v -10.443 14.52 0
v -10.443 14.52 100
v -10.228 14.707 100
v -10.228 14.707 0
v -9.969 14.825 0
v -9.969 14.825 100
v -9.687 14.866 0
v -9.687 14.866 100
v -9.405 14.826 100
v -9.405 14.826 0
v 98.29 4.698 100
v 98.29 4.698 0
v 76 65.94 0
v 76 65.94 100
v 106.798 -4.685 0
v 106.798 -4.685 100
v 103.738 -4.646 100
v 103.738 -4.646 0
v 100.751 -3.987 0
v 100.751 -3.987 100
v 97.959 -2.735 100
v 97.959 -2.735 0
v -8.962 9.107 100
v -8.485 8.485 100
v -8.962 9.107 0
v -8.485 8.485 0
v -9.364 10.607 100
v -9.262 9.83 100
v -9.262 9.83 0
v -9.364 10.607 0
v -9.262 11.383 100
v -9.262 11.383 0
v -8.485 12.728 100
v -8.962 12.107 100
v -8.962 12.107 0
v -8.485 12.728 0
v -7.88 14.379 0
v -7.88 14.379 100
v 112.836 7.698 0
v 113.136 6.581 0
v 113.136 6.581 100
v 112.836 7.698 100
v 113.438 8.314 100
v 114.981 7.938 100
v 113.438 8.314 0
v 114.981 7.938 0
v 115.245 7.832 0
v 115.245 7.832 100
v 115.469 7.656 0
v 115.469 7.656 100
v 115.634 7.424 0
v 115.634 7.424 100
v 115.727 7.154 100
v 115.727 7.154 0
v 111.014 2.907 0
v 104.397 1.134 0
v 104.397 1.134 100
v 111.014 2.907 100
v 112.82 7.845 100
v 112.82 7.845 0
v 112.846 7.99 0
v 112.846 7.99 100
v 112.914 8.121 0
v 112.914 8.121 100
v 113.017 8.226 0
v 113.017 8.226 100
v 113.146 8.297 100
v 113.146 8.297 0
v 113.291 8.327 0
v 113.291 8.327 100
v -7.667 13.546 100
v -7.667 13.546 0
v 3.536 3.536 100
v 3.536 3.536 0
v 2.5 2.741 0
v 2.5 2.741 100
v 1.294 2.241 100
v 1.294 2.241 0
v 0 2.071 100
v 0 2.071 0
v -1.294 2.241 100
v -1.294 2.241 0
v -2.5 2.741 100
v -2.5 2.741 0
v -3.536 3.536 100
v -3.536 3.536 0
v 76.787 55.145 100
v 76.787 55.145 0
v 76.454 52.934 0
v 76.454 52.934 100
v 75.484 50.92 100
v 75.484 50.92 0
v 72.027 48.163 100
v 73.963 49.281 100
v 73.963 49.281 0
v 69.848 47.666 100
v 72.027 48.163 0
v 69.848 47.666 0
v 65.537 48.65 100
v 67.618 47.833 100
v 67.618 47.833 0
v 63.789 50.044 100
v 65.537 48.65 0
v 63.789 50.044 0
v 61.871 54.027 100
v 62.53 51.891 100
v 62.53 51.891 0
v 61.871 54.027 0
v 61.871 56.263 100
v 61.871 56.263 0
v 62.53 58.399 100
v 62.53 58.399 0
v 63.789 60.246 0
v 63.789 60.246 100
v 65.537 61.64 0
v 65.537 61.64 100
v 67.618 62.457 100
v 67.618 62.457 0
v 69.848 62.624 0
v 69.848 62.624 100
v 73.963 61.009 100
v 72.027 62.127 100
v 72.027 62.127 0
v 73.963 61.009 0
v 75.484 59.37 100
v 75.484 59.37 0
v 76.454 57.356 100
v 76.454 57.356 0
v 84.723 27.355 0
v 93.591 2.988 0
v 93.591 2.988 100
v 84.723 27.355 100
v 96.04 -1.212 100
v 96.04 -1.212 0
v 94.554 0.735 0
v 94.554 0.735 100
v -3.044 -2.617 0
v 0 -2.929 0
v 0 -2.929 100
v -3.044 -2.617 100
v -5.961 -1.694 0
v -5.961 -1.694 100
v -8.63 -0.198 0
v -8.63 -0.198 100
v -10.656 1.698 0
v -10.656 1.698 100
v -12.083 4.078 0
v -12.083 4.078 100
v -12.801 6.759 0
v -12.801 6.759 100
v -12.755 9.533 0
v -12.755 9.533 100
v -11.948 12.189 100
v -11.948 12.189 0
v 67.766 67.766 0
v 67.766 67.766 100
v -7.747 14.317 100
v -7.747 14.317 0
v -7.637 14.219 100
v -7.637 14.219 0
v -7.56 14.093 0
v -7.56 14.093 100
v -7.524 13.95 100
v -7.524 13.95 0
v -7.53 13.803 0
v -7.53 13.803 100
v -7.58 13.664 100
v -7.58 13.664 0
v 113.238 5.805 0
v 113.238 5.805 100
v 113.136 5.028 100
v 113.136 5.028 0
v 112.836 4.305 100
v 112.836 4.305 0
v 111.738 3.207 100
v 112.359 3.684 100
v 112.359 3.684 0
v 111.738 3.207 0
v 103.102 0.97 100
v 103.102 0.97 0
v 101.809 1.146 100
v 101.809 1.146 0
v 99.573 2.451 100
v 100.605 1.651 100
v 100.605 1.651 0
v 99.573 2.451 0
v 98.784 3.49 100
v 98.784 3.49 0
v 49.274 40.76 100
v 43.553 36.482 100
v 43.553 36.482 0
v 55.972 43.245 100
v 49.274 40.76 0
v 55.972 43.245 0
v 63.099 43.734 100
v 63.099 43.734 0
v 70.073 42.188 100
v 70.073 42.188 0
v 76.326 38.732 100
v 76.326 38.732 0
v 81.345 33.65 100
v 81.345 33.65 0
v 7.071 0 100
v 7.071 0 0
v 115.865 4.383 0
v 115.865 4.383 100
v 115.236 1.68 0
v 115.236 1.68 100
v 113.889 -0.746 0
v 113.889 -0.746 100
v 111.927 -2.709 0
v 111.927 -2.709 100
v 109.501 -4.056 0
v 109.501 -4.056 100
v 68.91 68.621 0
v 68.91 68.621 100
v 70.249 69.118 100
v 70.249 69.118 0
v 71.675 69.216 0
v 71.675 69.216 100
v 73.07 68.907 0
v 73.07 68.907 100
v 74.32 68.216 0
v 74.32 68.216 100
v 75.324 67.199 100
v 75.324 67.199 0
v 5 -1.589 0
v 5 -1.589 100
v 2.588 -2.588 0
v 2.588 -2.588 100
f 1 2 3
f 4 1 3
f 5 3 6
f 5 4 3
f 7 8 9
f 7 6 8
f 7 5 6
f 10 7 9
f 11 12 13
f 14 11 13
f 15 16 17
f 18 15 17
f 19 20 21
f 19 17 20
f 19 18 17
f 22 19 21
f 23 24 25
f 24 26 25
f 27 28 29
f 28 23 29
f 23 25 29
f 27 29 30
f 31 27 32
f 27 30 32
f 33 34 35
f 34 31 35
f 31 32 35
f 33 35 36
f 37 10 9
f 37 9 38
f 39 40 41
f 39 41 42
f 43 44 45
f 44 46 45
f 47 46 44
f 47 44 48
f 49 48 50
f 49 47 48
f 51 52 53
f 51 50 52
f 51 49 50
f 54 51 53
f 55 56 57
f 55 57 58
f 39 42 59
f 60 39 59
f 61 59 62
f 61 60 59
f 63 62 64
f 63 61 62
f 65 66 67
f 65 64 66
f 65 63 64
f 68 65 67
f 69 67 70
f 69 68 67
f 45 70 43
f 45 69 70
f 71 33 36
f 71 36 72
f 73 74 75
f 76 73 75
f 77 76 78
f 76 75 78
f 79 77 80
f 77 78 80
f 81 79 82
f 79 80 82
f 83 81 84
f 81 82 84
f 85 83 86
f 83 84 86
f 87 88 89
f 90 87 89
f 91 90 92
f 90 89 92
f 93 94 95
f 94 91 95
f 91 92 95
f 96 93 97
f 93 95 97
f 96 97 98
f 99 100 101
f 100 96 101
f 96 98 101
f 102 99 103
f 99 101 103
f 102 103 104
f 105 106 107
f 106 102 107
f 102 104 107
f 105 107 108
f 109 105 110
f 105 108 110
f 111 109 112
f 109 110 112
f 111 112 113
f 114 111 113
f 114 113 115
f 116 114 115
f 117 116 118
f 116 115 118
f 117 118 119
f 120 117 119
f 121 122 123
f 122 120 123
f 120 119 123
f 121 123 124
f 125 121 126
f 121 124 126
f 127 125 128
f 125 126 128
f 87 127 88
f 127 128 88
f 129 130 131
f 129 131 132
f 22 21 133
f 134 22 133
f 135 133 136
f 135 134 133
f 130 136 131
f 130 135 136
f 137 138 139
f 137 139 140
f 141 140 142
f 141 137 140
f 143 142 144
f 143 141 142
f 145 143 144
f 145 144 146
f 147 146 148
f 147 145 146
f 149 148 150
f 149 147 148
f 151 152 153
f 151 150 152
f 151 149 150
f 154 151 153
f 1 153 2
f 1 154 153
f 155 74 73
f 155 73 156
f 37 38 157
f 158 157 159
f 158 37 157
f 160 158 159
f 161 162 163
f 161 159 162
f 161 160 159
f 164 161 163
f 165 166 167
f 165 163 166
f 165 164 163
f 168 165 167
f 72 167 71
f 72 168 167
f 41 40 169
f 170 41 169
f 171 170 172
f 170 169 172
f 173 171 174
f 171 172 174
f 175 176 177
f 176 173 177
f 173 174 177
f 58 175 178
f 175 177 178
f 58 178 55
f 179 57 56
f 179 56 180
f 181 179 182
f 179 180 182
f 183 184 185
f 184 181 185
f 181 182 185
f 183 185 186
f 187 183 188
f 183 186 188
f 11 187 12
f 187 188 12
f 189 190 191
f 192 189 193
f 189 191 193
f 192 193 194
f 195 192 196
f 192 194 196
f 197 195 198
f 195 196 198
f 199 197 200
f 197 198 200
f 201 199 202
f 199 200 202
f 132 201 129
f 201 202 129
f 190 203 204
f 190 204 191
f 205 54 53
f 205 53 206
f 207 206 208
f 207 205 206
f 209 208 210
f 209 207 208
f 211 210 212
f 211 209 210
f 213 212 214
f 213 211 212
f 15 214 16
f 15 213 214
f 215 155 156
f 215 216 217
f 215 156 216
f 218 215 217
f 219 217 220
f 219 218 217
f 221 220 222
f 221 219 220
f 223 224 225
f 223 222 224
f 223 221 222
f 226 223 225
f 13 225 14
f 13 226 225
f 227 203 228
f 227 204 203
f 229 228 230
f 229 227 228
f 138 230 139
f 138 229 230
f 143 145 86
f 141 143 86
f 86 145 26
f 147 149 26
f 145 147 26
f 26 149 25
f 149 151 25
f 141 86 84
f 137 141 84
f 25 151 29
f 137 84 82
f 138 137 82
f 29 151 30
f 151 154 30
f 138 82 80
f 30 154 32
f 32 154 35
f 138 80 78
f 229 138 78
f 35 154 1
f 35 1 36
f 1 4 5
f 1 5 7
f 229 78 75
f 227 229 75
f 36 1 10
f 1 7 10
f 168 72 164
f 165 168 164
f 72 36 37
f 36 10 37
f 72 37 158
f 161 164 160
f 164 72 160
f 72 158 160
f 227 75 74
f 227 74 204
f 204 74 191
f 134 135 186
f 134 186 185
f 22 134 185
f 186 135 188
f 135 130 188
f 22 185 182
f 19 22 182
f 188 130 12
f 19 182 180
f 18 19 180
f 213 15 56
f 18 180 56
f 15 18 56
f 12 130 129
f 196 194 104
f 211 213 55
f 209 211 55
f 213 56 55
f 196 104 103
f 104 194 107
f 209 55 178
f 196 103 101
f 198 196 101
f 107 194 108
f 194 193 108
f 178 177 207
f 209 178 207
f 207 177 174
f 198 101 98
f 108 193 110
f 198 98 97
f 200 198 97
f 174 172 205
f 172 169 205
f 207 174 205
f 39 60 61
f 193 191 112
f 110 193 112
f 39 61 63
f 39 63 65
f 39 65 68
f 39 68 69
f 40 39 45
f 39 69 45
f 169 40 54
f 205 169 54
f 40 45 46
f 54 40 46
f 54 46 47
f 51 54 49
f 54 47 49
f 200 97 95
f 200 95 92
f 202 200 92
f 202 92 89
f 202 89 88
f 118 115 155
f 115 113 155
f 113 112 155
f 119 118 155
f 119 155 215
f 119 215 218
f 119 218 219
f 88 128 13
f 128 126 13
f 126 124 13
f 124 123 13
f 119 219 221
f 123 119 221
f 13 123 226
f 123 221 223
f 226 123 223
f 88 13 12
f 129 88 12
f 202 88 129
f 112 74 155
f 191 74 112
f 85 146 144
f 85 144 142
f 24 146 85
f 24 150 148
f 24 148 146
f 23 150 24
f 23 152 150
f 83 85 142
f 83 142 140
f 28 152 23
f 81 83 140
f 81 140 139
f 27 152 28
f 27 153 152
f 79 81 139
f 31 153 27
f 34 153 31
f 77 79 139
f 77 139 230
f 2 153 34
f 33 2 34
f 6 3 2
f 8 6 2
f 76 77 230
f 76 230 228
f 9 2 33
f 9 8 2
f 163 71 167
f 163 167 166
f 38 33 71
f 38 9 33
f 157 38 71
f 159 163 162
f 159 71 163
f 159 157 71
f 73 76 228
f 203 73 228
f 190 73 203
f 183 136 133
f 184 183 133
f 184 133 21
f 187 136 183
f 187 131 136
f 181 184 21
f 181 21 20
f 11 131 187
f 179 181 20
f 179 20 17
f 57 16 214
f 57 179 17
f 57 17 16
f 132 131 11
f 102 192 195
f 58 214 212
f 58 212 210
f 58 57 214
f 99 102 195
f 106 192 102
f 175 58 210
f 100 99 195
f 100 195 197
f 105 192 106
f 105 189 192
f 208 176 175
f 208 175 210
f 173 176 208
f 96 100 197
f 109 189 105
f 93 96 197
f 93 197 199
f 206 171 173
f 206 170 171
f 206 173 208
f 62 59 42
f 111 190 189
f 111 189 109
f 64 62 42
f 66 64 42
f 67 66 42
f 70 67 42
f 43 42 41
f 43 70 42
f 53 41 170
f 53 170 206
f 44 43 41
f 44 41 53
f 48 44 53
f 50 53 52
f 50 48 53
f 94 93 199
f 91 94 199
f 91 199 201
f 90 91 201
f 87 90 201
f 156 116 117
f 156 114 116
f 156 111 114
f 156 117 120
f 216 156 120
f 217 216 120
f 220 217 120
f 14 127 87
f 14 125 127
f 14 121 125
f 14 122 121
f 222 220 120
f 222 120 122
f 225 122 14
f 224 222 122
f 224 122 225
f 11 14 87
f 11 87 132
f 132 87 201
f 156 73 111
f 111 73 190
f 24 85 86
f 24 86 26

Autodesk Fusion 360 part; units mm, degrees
sketch "Sketch1" plane through (0, 0, 0) normal (0, 0, 1) x (1, 0, 0)
  line L0 (3.5355, 3.5355) -> (67.7657, 67.7657)
  line L1 (98.2899, 4.6985) -> (75.9997, 65.9403)
  line L2 (-3.5355, 3.5355) -> (-8.4853, 8.4853)
  arc A0 (75.9997, 65.9403) -> (67.7657, 67.7657) centre (71.3012, 64.2302) ccw
  line L3 (-8.4853, 12.7279) -> (-7.6674, 13.5458)
  line L4 (-10.6066, 10.6066) -> (-5.6066, 10.6066) construction
  arc A1 (-3.5355, 3.5355) -> (3.5355, 3.5355) centre (0, 7.0711) ccw
  arc A2 (-8.4853, 12.7279) -> (-8.4853, 8.4853) centre (-6.364, 10.6066) ccw
  line L5 (7.0711, 0) -> (43.5529, 36.4818)
  line L6 (93.5914, 2.9884) -> (84.7228, 27.3546)
  arc A3 (84.7228, 27.3546) -> (43.5529, 36.4818) centre (61.2305, 18.8041) ccw
  circle A4 centre (69.2871, 55.145) radius 7.5
  arc A5 (0, -2.9289) -> (7.0711, 0) centre (0, 7.0711) ccw
  line L7 (0, -2.9289) -> (0, -2.9289)
  line L8 (-9.9476, 15.0524) -> (-10, 15)
  line L9 (-9.405, 14.8257) -> (-7.8804, 14.3792)
  arc A6 (-8.6295, -0.1981) -> (0, -2.9289) centre (0, 12.0711) ccw
  arc A7 (-10.4427, 14.5199) -> (-8.6295, -0.1981) centre (-2.8765, 7.9814) ccw
  arc A8 (-9.405, 14.8257) -> (-10.4427, 14.5199) centre (-9.6861, 13.866) ccw
  arc A9 (-7.6674, 13.5458) -> (-7.8804, 14.3792) centre (-8.021, 13.8993) ccw
  arc A10 (111.0144, 2.9071) -> (113.1357, 6.5813) centre (110.2379, 5.8048) ccw
  line L10 (97.9588, -2.7353) -> (97.9588, -2.7353)
  arc A11 (98.2899, 4.6985) -> (104.3967, 1.1339) centre (103.1256, 5.9696) ccw
  line L11 (115.5643, 7.8632) -> (115.5835, 7.7916)
  arc A12 (113.4375, 8.3138) -> (112.8363, 7.6985) centre (113.3193, 7.8279) ccw
  line L12 (104.3967, 1.1339) -> (111.0144, 2.9071)
  arc A13 (115.7269, 7.1545) -> (114.9811, 7.9382) centre (114.7447, 6.9665) ccw
  line L13 (113.1357, 6.5813) -> (112.8363, 7.6985)
  arc A14 (106.7976, -4.6851) -> (115.7269, 7.1545) centre (105.9051, 5.275) ccw
  line L14 (114.9811, 7.9382) -> (113.4375, 8.3138)
  arc A15 (93.5914, 2.9884) -> (97.9588, -2.7353) centre (103.1064, 5.7205) ccw
  arc A16 (97.9588, -2.7353) -> (106.7976, -4.6851) centre (105.4588, 10.2551) ccw
  point P0 (100, 0)
  point P1 (-7.0711, 14.1421)
  point P2 (95.6559, -0.9674)
  point P3 (102.727, -0.9674)
  point P4 (99.4233, -0.1988)
  point P5 (112.6181, 8.5131)
  dimension "d2" = 100
  dimension "d6" = 15
  dimension "d9" = 5
  dimension "d10" = 45
  dimension "d11" = 5
  dimension "d13" = 5
  dimension "d15" = 3
  dimension "d19" = 25
  dimension "d20" = 15
  dimension "d21" = 10
  dimension "d23" = 10
  dimension "d26" = 15
  dimension "d27" = 10
  dimension "d28" = 1
  dimension "d29" = 0.5
extrude "Extrude1" add sketch "Sketch1" along normal blind 100
sketch "Sketch2" plane through (0, 0, 0) normal (-0.7071, 0.7071, 0) x (-0.7071, -0.7071, 0)
  line L0 (-95.8352, 0) -> (-5, 0)
  line L1 (-5, 0) -> (-5, 100)
  line L2 (-5, 100) -> (-95.8352, 100)
  line L3 (-95.8352, 100) -> (-95.8352, 0)
  ellipse E0 centre (-30, 50) end of major axis (-30, 90) minor radius 20
  line L4 (-30, 10) -> (-30, 90)
  line L5 (-10, 50) -> (-50, 50)
sketch "Sketch3" plane through (88.3022, 32.1394, 0) normal (0.9397, 0.342, 0) x (-0.342, 0.9397, 0)
  line L0 (-29.202, 0) -> (35.9702, 0)
  line L1 (35.9702, 0) -> (35.9702, 100)
  line L2 (35.9702, 100) -> (-29.202, 100)
  line L3 (-29.202, 100) -> (-29.202, 0)
  ellipse E0 centre (-15, 50) end of major axis (-15, 90) minor radius 10
  line L4 (-15, 10) -> (-15, 90)
  line L5 (-5, 50) -> (-25, 50)
  dimension "d35" = 20
extrude "Extrude3" [suppressed]
extrude "Extrude4" [suppressed]
